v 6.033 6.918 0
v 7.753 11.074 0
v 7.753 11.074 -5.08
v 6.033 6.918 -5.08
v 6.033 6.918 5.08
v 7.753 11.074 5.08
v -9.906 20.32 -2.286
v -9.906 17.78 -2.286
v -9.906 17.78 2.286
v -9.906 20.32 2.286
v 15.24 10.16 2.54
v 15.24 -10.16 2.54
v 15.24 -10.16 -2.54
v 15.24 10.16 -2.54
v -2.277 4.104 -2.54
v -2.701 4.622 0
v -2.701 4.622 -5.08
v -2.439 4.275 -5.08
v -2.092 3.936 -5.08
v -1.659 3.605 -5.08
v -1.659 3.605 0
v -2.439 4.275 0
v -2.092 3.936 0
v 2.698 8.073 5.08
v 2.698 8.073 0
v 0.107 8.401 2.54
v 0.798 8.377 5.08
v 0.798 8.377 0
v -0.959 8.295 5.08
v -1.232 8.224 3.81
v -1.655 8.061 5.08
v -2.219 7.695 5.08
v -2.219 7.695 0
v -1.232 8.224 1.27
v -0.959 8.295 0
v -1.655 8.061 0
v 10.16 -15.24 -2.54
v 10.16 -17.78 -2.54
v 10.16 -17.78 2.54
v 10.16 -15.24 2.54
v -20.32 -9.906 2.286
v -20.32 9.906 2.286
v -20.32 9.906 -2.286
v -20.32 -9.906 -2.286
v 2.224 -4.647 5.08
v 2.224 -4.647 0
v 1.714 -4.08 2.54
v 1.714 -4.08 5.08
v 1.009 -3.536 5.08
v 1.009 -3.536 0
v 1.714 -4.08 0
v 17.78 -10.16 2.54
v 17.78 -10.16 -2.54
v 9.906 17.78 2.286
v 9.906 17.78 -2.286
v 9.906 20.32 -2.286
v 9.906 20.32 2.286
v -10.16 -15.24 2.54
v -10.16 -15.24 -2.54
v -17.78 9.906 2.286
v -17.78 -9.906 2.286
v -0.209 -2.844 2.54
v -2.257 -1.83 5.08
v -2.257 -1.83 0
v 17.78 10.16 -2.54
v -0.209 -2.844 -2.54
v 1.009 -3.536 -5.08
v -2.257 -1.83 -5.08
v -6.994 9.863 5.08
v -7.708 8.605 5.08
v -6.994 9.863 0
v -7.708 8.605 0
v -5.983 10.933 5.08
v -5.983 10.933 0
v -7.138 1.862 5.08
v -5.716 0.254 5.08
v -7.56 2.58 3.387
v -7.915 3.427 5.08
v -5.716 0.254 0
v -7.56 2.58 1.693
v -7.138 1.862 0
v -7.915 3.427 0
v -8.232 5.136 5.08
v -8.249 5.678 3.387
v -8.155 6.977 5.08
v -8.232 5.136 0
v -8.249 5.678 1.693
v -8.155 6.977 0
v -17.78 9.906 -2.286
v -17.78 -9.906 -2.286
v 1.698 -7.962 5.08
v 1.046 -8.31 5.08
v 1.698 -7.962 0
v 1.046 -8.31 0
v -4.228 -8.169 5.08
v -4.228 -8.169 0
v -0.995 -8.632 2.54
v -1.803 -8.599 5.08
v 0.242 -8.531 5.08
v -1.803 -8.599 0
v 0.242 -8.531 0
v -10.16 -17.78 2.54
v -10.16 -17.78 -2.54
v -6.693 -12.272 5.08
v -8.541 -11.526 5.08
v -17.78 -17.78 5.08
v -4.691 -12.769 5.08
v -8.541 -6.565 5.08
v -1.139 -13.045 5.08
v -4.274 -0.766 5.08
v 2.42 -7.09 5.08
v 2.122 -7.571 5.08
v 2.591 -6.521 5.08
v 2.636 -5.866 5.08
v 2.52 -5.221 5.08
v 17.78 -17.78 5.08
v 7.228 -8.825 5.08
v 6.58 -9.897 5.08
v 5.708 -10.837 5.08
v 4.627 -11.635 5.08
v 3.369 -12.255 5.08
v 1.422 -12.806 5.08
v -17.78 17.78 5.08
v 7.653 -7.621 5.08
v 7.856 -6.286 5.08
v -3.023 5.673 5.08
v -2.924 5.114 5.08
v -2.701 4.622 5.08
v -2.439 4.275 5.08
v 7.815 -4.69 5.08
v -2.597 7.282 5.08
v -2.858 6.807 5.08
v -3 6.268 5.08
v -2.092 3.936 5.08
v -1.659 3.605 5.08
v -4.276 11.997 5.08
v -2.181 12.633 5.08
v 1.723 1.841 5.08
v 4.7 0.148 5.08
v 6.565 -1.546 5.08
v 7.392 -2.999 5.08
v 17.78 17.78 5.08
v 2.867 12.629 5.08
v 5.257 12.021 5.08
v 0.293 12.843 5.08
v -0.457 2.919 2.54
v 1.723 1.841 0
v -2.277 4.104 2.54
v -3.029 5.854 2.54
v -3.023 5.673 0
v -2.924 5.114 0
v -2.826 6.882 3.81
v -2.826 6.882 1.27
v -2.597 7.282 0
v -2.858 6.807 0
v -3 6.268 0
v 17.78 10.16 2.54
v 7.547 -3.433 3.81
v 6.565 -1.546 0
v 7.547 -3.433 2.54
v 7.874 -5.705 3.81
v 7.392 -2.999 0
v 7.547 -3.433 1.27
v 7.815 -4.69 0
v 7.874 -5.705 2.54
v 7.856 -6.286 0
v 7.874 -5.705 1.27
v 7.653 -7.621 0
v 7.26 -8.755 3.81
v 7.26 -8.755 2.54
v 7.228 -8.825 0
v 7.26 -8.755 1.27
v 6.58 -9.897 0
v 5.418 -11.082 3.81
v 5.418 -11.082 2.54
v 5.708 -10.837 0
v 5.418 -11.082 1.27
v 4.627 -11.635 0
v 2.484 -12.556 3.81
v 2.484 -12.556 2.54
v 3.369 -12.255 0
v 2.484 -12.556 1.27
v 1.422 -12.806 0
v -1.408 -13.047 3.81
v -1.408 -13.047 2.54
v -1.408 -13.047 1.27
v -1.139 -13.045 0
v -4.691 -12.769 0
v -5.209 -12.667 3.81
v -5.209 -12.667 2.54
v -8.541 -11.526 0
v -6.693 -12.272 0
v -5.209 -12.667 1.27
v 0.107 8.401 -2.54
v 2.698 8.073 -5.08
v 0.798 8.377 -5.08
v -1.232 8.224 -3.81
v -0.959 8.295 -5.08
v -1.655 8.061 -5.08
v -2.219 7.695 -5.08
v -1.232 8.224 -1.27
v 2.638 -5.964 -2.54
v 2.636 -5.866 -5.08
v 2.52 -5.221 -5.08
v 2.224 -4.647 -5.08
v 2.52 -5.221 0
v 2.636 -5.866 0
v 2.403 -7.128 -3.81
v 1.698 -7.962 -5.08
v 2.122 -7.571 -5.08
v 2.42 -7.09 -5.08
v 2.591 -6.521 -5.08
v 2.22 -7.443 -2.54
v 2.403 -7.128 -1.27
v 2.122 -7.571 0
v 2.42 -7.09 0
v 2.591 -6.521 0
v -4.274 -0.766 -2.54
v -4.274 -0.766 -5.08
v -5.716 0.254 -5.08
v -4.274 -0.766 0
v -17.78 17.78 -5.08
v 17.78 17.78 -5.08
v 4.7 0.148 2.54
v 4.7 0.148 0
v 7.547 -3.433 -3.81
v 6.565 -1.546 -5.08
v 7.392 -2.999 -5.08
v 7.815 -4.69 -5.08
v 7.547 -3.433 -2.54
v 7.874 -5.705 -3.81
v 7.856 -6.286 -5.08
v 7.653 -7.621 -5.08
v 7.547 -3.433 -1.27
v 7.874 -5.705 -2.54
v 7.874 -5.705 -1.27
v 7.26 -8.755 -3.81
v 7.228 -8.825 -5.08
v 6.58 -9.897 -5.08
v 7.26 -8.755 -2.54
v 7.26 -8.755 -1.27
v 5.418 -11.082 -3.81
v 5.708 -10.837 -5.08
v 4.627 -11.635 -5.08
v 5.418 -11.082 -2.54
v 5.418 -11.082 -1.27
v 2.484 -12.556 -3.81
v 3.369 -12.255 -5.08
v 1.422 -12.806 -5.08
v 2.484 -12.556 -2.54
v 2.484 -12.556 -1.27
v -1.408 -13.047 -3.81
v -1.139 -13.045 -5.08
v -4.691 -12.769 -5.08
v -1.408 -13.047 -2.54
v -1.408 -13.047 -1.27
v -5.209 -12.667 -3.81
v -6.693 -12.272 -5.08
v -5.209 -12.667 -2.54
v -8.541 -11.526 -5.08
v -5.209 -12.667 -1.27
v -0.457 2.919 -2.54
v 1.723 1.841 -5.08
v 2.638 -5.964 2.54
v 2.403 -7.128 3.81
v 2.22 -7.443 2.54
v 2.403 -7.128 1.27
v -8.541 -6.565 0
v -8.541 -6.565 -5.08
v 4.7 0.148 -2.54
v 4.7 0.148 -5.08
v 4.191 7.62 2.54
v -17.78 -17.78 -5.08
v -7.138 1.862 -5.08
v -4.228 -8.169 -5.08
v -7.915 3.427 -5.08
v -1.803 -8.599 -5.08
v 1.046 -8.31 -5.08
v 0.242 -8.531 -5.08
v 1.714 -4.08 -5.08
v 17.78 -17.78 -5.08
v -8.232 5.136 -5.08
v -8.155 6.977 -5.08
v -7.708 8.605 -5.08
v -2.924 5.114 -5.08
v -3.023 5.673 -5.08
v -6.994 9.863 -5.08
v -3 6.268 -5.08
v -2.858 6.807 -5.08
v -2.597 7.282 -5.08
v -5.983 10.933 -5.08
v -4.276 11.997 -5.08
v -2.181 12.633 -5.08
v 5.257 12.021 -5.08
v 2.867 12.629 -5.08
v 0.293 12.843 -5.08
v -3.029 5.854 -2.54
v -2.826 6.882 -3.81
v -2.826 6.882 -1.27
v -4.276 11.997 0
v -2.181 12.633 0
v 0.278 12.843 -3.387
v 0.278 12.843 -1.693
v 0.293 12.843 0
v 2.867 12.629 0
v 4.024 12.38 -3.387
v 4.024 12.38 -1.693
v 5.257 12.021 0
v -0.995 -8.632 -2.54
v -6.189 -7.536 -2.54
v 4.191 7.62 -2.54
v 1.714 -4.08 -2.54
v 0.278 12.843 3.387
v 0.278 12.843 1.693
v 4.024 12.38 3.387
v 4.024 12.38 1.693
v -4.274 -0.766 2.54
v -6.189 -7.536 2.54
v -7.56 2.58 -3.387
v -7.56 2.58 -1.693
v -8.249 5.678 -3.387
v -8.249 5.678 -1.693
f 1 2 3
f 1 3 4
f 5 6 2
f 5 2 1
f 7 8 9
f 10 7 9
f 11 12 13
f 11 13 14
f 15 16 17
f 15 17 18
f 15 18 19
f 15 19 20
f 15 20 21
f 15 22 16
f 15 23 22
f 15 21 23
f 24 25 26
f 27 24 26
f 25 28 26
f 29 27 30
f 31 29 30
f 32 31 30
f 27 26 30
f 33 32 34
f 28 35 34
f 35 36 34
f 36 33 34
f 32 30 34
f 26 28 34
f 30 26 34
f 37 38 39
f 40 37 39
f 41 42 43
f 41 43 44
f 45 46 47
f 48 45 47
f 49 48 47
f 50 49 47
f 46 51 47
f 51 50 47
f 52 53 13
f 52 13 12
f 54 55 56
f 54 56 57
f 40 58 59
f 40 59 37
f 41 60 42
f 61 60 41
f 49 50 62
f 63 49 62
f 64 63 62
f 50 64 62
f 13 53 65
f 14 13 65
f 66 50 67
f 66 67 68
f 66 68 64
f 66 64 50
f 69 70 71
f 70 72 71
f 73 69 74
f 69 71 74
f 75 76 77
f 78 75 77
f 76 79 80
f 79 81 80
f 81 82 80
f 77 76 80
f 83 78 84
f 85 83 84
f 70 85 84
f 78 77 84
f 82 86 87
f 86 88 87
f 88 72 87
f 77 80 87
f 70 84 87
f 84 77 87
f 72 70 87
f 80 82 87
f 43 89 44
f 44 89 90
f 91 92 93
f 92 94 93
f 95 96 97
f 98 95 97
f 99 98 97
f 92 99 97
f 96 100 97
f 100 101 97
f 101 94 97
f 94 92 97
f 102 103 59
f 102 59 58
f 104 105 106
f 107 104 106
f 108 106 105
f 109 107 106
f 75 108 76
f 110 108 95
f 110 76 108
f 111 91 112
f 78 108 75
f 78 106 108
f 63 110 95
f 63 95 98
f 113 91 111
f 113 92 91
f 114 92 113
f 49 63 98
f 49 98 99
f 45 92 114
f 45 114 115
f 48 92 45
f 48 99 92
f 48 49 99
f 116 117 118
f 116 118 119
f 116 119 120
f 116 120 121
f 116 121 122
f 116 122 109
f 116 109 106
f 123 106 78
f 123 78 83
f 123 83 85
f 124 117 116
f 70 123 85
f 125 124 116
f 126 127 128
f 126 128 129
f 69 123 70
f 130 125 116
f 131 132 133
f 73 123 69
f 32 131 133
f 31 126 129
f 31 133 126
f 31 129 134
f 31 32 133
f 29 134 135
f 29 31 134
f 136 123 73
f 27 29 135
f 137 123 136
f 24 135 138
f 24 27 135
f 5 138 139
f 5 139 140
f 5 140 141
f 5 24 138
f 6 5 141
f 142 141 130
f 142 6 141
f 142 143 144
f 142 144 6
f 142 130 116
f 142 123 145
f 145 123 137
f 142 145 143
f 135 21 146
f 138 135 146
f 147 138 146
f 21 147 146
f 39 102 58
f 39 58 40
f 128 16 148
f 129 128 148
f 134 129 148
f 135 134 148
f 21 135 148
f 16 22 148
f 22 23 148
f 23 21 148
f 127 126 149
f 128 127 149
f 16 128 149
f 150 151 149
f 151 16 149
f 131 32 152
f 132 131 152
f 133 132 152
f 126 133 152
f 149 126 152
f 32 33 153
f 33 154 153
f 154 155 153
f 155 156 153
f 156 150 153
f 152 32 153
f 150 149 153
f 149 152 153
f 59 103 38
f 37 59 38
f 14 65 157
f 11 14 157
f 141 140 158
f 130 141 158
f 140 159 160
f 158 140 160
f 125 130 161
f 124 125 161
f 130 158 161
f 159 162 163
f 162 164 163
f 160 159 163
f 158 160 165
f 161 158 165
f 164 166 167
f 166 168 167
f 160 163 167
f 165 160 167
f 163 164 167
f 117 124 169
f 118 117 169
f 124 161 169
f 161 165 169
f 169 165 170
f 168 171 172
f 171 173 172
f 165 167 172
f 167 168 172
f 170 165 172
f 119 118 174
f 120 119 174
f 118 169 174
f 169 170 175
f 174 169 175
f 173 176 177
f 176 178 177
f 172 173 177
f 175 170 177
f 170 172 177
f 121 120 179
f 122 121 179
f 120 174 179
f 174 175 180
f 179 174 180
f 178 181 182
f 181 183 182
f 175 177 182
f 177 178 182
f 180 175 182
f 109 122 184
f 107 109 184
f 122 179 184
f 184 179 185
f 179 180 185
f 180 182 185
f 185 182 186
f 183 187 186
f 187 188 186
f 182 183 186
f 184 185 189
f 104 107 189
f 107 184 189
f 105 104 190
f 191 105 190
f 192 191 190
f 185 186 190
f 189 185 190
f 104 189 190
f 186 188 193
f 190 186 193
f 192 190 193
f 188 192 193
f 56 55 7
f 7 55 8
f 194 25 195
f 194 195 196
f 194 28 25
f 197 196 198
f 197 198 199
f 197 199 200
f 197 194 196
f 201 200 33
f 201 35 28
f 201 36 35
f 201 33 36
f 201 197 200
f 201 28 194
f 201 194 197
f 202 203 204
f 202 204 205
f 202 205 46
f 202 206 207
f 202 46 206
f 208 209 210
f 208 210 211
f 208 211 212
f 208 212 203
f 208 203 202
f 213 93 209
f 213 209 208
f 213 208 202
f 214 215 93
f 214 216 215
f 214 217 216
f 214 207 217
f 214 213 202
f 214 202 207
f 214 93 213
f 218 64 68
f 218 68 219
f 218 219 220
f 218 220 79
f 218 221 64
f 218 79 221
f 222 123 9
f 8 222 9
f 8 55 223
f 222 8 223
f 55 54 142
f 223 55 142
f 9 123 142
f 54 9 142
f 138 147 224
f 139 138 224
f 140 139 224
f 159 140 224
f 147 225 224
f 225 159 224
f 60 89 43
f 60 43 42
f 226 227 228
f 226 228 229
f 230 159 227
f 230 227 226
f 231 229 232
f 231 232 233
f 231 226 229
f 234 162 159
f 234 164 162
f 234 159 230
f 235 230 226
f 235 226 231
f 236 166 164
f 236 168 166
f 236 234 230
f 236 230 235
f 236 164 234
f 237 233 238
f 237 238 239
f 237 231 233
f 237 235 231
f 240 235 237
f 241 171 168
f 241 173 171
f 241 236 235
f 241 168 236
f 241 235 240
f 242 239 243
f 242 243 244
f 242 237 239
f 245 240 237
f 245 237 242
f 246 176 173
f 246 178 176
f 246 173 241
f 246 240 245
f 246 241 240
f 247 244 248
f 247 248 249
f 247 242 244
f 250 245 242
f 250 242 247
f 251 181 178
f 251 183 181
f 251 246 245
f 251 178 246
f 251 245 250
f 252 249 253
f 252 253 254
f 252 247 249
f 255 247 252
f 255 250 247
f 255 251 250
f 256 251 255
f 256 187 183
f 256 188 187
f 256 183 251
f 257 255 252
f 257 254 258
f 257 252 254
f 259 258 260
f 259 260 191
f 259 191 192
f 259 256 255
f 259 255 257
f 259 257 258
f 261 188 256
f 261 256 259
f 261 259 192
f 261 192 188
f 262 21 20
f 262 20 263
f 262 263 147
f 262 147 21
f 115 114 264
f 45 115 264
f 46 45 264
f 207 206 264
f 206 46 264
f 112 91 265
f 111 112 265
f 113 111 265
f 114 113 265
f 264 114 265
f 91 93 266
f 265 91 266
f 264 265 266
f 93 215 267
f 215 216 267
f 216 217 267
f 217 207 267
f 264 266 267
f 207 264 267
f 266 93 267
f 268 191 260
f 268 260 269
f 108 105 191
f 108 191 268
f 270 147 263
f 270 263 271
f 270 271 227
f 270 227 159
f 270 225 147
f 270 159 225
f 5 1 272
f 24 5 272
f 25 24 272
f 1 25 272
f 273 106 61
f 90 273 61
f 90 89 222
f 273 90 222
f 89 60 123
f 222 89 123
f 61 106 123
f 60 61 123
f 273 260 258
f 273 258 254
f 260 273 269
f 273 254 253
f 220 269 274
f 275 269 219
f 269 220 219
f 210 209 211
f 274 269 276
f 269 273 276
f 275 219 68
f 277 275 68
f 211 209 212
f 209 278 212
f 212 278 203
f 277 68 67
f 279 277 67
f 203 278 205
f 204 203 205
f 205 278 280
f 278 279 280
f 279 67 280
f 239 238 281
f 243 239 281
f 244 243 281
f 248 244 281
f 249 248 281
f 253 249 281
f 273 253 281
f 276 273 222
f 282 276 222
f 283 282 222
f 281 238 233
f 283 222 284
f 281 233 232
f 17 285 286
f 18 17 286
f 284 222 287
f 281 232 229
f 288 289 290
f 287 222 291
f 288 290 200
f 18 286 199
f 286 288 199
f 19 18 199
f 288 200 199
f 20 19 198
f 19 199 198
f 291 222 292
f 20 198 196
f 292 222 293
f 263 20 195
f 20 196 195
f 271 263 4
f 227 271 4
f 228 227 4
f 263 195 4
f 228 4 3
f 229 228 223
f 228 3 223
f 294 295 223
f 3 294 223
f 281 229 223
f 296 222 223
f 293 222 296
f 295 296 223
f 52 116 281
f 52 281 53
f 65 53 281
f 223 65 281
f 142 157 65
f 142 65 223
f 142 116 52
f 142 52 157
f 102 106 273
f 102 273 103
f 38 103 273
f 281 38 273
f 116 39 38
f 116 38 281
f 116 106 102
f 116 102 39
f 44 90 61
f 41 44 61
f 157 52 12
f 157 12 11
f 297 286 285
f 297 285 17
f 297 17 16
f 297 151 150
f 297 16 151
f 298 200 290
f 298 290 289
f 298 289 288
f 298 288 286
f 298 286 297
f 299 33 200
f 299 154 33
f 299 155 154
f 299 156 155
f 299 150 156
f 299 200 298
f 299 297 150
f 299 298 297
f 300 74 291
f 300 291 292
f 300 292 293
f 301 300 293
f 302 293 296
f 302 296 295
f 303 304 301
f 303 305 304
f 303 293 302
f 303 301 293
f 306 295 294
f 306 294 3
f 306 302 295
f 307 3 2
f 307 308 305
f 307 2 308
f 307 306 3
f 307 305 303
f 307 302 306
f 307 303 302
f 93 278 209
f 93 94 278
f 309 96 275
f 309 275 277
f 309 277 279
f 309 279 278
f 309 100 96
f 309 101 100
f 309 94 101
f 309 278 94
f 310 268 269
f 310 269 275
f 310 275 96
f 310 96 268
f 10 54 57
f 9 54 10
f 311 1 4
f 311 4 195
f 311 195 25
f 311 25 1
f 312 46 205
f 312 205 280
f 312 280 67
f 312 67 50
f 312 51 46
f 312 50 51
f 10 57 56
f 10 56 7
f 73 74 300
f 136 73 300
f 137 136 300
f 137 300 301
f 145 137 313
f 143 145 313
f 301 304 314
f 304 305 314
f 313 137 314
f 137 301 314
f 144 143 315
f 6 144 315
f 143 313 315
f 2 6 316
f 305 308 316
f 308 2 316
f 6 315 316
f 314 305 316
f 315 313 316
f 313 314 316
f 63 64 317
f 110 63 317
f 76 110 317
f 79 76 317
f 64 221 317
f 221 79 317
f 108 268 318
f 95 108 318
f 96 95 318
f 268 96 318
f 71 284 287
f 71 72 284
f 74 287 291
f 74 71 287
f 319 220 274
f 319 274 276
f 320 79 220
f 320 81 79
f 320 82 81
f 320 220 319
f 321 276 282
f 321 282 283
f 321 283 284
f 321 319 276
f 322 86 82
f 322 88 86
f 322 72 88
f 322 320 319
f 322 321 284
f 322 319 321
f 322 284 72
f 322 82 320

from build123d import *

# Parameters (mm, degrees)
F0_W     = 35.56
F0_H     = 35.56
F1_DEPTH = 5.08
F2_W     = 19.812
F2_H     = 4.572
F3_DEPTH = 2.54
F4_W     = 19.812
F4_H     = 4.572
F5_DEPTH = 2.54
F6_W     = 20.32
F6_H     = 5.08
F7_DEPTH = 2.54
F8_W     = 20.32
F8_H     = 5.08
F9_DEPTH = 2.54


with BuildPart() as f1:
    # F0 (on Top) → F1 (new body, symmetric)
    with BuildSketch(Plane.XY):
        Rectangle(F0_W, F0_H)
        with BuildLine():
            add(Edge.make_bspline(
                [(6.5649739583, -1.5461588542), (7.8741102431, -3.2411458333), (7.8741102431, -5.705078125)],
                knots=[0, 0, 0, 1, 1, 1], degree=2))
            add(Edge.make_bspline(
                [(7.8741102431, -5.705078125), (7.8741102431, -9.1171006944), (5.4184461806, -11.0821831597)],
                knots=[0, 0, 0, 1, 1, 1], degree=2))
            add(Edge.make_bspline(
                [(5.4184461806, -11.0821831597), (2.9627821181, -13.047265625), (-1.4083550347, -13.047265625)],
                knots=[0, 0, 0, 1, 1, 1], degree=2))
            add(Edge.make_bspline(
                [(-1.4083550347, -13.047265625), (-5.4432508681, -13.047265625), (-8.5410807292, -11.5259114583)],
                knots=[0, 0, 0, 1, 1, 1], degree=2))
            Line((-8.5410807292, -11.5259114583), (-8.5410807292, -6.5649739583))
            add(Edge.make_bspline(
                [(-8.5410807292, -6.5649739583), (-5.9944661458, -7.7059895833), (-4.2278211806, -8.1690104167)],
                knots=[0, 0, 0, 1, 1, 1], degree=2))
            add(Edge.make_bspline(
                [(-4.2278211806, -8.1690104167), (-2.4611762153, -8.63203125), (-0.9949435764, -8.63203125)],
                knots=[0, 0, 0, 1, 1, 1], degree=2))
            add(Edge.make_bspline(
                [(-0.9949435764, -8.63203125), (0.7579210069, -8.63203125), (1.6977430556, -7.9623046875)],
                knots=[0, 0, 0, 1, 1, 1], degree=2))
            add(Edge.make_bspline(
                [(1.6977430556, -7.9623046875), (2.6375651042, -7.292578125), (2.6375651042, -5.9641493056)],
                knots=[0, 0, 0, 1, 1, 1], degree=2))
            add(Edge.make_bspline(
                [(2.6375651042, -5.9641493056), (2.6375651042, -5.2255208333), (2.2241536458, -4.6467447917)],
                knots=[0, 0, 0, 1, 1, 1], degree=2))
            add(Edge.make_bspline(
                [(2.2241536458, -4.6467447917), (1.8107421875, -4.06796875), (1.0087239583, -3.5360460069)],
                knots=[0, 0, 0, 1, 1, 1], degree=2))
            add(Edge.make_bspline(
                [(1.0087239583, -3.5360460069), (0.2067057292, -3.0041232639), (-2.2572265625, -1.8300347222)],
                knots=[0, 0, 0, 1, 1, 1], degree=2))
            add(Edge.make_bspline(
                [(-2.2572265625, -1.8300347222), (-4.5613064236, -0.744140625), (-5.7161024306, 0.2535590278)],
                knots=[0, 0, 0, 1, 1, 1], degree=2))
            add(Edge.make_bspline(
                [(-5.7161024306, 0.2535590278), (-6.8708984375, 1.2512586806), (-7.5599175347, 2.5796875)],
                knots=[0, 0, 0, 1, 1, 1], degree=2))
            add(Edge.make_bspline(
                [(-7.5599175347, 2.5796875), (-8.2489366319, 3.9081163194), (-8.2489366319, 5.6775173611)],
                knots=[0, 0, 0, 1, 1, 1], degree=2))
            add(Edge.make_bspline(
                [(-8.2489366319, 5.6775173611), (-8.2489366319, 9.0233940972), (-5.9834418403, 10.9333550347)],
                knots=[0, 0, 0, 1, 1, 1], degree=2))
            add(Edge.make_bspline(
                [(-5.9834418403, 10.9333550347), (-3.7179470486, 12.8433159722), (0.2783637153, 12.8433159722)],
                knots=[0, 0, 0, 1, 1, 1], degree=2))
            add(Edge.make_bspline(
                [(0.2783637153, 12.8433159722), (2.2406901042, 12.8433159722), (4.0238715278, 12.3802951389)],
                knots=[0, 0, 0, 1, 1, 1], degree=2))
            add(Edge.make_bspline(
                [(4.0238715278, 12.3802951389), (5.8070529514, 11.9172743056), (7.7528428819, 11.0739149306)],
                knots=[0, 0, 0, 1, 1, 1], degree=2))
            Line((7.7528428819, 11.0739149306), (6.0330512153, 6.9177517361))
            add(Edge.make_bspline(
                [(6.0330512153, 6.9177517361), (4.0156032986, 7.7445746528), (2.6981987847, 8.0725477431)],
                knots=[0, 0, 0, 1, 1, 1], degree=2))
            add(Edge.make_bspline(
                [(2.6981987847, 8.0725477431), (1.3807942708, 8.4005208333), (0.1074869792, 8.4005208333)],
                knots=[0, 0, 0, 1, 1, 1], degree=2))
            add(Edge.make_bspline(
                [(0.1074869792, 8.4005208333), (-1.4083550347, 8.4005208333), (-2.2186414931, 7.6949652778)],
                knots=[0, 0, 0, 1, 1, 1], degree=2))
            add(Edge.make_bspline(
                [(-2.2186414931, 7.6949652778), (-3.0289279514, 6.9894097222), (-3.0289279514, 5.85390625)],
                knots=[0, 0, 0, 1, 1, 1], degree=2))
            add(Edge.make_bspline(
                [(-3.0289279514, 5.85390625), (-3.0289279514, 5.1483506944), (-2.7009548611, 4.6219401042)],
                knots=[0, 0, 0, 1, 1, 1], degree=2))
            add(Edge.make_bspline(
                [(-2.7009548611, 4.6219401042), (-2.3729817708, 4.0955295139), (-1.6591579861, 3.6049479167)],
                knots=[0, 0, 0, 1, 1, 1], degree=2))
            add(Edge.make_bspline(
                [(-1.6591579861, 3.6049479167), (-0.9453342014, 3.1143663194), (1.7225477431, 1.8410590278)],
                knots=[0, 0, 0, 1, 1, 1], degree=2))
            add(Edge.make_bspline(
                [(1.7225477431, 1.8410590278), (5.2558376736, 0.148828125), (6.5649739583, -1.5461588542)],
                knots=[0, 0, 0, 1, 1, 1], degree=2))
        make_face(mode=Mode.SUBTRACT)
    extrude(amount=F1_DEPTH, both=True)

    # F2 (on face) → F3 (join)
    with BuildSketch(Plane(origin=(0, 17.78, 0), x_dir=(-1, 0, 0), z_dir=(0, 1, 0))):
        Rectangle(F2_W, F2_H)
    extrude(amount=F3_DEPTH)

    # F4 (on face) → F5 (join)
    with BuildSketch(Plane(origin=(-17.78, 0, 0), x_dir=(0, -1, 0), z_dir=(-1, 0, 0))):
        Rectangle(F4_W, F4_H)
    extrude(amount=F5_DEPTH)

    # F6 (on face) → F7 (cut)
    with BuildSketch(Plane.XZ.offset(17.78)):
        Rectangle(F6_W, F6_H)
    extrude(amount=-F7_DEPTH, mode=Mode.SUBTRACT)

    # F8 (on face) → F9 (cut)
    with BuildSketch(Plane.YZ.offset(17.78)):
        Rectangle(F8_W, F8_H)
    extrude(amount=-F9_DEPTH, mode=Mode.SUBTRACT)


solid = f1.part
